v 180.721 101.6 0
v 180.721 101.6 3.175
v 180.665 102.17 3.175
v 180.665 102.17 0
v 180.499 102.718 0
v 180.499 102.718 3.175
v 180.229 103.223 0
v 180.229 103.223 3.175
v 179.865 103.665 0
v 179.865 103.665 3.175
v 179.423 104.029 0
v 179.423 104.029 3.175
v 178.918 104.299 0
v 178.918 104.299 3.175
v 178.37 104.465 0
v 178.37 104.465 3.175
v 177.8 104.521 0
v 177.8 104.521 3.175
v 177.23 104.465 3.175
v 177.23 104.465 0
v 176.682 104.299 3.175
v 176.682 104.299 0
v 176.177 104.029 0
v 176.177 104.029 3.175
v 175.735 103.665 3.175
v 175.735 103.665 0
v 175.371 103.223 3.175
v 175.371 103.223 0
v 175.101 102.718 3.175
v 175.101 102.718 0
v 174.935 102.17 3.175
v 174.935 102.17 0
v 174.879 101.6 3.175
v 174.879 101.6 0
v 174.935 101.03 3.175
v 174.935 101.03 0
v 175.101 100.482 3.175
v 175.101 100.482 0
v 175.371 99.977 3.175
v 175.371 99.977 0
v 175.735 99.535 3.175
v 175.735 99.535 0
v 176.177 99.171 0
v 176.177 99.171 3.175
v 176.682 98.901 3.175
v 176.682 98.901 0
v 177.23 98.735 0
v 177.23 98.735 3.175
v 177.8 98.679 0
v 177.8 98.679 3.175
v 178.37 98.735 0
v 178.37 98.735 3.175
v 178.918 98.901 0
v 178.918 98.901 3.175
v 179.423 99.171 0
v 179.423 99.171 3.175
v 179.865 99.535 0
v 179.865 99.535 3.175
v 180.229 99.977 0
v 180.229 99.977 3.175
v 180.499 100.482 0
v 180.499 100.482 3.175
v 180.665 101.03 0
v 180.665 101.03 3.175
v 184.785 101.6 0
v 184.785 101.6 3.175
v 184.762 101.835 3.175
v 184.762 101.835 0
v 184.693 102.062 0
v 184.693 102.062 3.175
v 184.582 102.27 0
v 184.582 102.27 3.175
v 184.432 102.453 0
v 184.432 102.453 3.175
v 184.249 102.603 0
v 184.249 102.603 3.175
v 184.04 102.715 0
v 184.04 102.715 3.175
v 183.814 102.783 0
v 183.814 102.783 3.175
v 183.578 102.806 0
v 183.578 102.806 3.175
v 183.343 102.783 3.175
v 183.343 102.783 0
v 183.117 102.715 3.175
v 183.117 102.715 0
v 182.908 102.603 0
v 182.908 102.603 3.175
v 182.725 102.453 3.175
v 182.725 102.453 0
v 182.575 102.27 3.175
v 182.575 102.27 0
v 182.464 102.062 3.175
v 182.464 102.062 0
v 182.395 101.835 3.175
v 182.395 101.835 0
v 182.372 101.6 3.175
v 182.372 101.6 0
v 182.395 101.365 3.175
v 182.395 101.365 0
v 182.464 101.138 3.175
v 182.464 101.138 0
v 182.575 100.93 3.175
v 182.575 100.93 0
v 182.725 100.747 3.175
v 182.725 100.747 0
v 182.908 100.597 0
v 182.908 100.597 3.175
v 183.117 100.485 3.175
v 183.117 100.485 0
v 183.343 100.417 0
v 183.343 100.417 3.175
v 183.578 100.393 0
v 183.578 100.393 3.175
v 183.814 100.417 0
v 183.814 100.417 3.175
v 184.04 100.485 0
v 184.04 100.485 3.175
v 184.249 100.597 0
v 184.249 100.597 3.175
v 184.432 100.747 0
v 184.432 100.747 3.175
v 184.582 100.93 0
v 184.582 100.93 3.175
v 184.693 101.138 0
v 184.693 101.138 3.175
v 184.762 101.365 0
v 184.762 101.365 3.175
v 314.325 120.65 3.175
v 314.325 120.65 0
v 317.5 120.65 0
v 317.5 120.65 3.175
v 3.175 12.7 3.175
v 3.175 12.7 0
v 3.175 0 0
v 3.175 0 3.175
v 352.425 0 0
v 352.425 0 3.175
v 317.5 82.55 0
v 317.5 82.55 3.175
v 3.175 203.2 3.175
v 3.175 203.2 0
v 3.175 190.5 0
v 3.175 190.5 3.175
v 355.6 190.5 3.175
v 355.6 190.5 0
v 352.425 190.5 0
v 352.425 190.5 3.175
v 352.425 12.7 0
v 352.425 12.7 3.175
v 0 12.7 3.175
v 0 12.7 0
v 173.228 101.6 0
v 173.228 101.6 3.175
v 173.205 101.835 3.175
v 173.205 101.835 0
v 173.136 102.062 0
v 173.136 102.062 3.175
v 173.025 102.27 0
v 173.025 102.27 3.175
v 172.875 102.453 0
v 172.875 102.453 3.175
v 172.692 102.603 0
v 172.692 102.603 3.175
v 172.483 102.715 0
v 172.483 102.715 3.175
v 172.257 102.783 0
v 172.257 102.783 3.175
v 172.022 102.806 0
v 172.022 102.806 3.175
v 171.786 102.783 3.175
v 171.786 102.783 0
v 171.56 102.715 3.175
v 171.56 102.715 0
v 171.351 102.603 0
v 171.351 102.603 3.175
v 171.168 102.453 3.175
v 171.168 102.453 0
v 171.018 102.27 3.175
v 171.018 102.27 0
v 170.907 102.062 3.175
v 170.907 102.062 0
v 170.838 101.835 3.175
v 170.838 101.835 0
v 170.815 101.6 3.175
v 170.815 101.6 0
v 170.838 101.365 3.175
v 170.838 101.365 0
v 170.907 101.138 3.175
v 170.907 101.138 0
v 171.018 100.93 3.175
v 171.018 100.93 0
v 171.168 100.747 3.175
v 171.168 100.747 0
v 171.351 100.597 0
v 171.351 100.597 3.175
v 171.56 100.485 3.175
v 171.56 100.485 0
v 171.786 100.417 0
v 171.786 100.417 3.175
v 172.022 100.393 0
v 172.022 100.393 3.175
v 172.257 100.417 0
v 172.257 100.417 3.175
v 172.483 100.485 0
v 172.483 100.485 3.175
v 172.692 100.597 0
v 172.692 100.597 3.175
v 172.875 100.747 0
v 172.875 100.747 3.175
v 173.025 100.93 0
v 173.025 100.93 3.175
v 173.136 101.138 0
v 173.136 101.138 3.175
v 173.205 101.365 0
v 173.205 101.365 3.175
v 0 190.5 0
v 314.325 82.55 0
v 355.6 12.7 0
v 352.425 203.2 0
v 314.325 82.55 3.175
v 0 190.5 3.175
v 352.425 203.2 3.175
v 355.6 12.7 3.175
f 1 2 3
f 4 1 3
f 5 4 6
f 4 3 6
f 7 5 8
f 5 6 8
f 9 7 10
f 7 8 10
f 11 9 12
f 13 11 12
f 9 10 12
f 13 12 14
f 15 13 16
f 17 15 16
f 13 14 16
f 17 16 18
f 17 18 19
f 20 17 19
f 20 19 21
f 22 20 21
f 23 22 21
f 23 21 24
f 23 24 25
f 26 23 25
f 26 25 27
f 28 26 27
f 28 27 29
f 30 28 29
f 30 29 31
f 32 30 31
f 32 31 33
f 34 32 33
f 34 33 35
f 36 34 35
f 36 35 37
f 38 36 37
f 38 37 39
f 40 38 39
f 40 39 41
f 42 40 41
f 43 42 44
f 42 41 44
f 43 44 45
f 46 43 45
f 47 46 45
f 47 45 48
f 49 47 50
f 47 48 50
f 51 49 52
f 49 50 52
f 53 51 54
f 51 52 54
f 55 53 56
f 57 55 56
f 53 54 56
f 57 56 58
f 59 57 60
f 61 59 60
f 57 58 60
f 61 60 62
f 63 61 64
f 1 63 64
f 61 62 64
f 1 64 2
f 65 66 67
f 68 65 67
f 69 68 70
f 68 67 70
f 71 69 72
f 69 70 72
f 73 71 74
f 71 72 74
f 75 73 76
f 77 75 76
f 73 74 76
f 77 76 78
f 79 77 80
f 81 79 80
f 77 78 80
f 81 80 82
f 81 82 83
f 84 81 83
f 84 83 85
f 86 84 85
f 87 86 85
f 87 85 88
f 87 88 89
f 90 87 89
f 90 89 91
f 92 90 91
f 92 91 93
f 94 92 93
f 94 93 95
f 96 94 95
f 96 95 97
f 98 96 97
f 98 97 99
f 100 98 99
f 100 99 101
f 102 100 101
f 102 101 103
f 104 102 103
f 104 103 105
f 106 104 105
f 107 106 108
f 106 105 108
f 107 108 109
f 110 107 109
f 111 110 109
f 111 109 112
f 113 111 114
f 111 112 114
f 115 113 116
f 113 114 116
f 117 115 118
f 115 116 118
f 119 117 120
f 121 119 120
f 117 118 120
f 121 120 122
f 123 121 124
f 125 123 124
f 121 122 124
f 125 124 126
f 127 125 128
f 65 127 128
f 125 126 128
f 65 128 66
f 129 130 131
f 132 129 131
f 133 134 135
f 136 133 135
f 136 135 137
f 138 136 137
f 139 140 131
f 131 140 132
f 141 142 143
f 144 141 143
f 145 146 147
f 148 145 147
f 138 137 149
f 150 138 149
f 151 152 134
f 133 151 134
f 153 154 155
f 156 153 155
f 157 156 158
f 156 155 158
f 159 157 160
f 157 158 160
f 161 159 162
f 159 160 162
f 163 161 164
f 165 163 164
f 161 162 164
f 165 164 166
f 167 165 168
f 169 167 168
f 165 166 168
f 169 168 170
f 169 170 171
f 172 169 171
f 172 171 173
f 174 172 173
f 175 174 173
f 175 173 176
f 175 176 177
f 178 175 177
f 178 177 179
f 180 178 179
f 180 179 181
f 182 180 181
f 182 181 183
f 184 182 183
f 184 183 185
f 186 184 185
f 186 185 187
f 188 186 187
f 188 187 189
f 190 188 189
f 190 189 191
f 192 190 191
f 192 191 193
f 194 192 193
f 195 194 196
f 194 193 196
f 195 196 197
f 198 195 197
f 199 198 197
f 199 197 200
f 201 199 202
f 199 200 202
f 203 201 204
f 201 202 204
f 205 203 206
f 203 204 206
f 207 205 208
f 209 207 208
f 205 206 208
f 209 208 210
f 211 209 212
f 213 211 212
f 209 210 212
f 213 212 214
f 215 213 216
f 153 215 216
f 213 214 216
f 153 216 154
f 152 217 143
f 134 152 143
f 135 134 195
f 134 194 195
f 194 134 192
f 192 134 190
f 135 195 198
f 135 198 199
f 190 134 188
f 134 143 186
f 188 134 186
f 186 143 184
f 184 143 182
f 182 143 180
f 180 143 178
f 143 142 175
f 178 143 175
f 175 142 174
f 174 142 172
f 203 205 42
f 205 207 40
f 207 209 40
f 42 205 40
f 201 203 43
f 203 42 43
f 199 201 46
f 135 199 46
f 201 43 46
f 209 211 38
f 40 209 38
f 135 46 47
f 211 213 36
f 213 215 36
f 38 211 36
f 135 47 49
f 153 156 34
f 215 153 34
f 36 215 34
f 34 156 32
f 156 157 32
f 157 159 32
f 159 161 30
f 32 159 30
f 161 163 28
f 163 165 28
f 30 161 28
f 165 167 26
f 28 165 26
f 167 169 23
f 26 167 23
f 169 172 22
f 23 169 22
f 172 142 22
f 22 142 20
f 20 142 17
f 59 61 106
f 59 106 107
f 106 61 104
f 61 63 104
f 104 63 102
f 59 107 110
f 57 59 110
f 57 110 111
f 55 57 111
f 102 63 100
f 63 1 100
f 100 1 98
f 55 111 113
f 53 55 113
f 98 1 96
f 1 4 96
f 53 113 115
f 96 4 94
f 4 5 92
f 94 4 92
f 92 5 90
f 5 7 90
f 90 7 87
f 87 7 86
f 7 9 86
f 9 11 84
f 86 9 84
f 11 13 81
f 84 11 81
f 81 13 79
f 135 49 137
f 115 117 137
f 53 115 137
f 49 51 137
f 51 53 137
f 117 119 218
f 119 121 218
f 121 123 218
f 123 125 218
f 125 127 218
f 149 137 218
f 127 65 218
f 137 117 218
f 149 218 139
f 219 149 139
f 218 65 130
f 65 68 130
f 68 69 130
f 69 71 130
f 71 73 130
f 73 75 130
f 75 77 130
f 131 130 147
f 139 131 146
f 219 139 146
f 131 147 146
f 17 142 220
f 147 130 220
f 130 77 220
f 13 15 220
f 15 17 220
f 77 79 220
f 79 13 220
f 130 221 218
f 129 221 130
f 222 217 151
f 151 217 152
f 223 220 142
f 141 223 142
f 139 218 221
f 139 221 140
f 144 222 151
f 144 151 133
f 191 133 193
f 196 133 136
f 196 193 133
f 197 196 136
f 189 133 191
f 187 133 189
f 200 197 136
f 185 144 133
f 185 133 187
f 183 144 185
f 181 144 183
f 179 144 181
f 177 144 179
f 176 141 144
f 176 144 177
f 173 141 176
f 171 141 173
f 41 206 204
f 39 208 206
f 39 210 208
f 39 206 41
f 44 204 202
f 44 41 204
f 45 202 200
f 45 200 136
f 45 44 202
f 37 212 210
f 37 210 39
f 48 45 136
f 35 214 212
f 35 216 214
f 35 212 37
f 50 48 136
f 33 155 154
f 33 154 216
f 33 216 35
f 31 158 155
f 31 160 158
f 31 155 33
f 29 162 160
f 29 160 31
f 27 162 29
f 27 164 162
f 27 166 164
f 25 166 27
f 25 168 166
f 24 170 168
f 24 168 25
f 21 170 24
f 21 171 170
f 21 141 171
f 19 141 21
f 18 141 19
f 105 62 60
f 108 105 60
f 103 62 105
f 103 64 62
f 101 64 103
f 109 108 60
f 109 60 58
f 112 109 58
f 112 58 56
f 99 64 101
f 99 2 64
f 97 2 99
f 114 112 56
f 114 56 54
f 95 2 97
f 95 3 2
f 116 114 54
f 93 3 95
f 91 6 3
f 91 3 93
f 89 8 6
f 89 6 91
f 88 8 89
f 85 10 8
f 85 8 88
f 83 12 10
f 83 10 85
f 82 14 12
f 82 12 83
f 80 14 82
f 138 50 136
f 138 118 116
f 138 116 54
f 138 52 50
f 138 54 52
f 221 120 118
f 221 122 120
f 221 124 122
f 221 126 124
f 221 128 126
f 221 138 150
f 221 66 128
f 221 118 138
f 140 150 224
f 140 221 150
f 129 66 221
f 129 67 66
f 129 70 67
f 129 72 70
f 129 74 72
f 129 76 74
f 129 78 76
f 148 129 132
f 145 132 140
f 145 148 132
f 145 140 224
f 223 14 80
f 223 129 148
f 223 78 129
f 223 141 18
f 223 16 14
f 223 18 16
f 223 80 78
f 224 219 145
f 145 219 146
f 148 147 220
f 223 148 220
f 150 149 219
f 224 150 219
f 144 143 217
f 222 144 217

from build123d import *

# Parameters (mm, degrees)
SHELF_DEPTH              = 3.175
TILT_MOUNT_SLOT_SKETCH_W = 3.175
TILT_MOUNT_SLOT_SKETCH_H = 38.1
TILT_MOUNT_SLOT_DEPTH    = 4.175
SKETCH2_R                = 2.921
SKETCH2_R_2              = 1.2065
CUT_EXTRUDE1_DEPTH       = 4.175


with BuildPart() as part:
    # Sketch1 → Shelf (new body)
    with BuildSketch(Plane.XY):
        Polygon((3.175, 203.2), (3.175, 190.5), (0, 190.5), (0, 12.7), (3.175, 12.7), (3.175, 0), (352.425, 0), (352.425, 12.7), (355.6, 12.7), (355.6, 190.5), (352.425, 190.5), (352.425, 203.2), align=None)
    extrude(amount=SHELF_DEPTH)

    # Tilt mount slot sketch → Tilt Mount Slot (cut, through all)
    with BuildSketch(Plane.XY.offset(3.175)):
        with Locations((315.9125, 101.6)):
            Rectangle(TILT_MOUNT_SLOT_SKETCH_W, TILT_MOUNT_SLOT_SKETCH_H)
    extrude(amount=-TILT_MOUNT_SLOT_DEPTH, mode=Mode.SUBTRACT)

    # Sketch2 → Cut-Extrude1 (cut, through all)
    with BuildSketch(Plane.XY.offset(3.175)):
        with Locations((177.8, 101.6)):
            Circle(SKETCH2_R)
        with Locations((183.5785, 101.6)):
            Circle(SKETCH2_R_2)
        with Locations((172.0215, 101.6)):
            Circle(SKETCH2_R_2)
    extrude(amount=-CUT_EXTRUDE1_DEPTH, mode=Mode.SUBTRACT)


solid = part.part
